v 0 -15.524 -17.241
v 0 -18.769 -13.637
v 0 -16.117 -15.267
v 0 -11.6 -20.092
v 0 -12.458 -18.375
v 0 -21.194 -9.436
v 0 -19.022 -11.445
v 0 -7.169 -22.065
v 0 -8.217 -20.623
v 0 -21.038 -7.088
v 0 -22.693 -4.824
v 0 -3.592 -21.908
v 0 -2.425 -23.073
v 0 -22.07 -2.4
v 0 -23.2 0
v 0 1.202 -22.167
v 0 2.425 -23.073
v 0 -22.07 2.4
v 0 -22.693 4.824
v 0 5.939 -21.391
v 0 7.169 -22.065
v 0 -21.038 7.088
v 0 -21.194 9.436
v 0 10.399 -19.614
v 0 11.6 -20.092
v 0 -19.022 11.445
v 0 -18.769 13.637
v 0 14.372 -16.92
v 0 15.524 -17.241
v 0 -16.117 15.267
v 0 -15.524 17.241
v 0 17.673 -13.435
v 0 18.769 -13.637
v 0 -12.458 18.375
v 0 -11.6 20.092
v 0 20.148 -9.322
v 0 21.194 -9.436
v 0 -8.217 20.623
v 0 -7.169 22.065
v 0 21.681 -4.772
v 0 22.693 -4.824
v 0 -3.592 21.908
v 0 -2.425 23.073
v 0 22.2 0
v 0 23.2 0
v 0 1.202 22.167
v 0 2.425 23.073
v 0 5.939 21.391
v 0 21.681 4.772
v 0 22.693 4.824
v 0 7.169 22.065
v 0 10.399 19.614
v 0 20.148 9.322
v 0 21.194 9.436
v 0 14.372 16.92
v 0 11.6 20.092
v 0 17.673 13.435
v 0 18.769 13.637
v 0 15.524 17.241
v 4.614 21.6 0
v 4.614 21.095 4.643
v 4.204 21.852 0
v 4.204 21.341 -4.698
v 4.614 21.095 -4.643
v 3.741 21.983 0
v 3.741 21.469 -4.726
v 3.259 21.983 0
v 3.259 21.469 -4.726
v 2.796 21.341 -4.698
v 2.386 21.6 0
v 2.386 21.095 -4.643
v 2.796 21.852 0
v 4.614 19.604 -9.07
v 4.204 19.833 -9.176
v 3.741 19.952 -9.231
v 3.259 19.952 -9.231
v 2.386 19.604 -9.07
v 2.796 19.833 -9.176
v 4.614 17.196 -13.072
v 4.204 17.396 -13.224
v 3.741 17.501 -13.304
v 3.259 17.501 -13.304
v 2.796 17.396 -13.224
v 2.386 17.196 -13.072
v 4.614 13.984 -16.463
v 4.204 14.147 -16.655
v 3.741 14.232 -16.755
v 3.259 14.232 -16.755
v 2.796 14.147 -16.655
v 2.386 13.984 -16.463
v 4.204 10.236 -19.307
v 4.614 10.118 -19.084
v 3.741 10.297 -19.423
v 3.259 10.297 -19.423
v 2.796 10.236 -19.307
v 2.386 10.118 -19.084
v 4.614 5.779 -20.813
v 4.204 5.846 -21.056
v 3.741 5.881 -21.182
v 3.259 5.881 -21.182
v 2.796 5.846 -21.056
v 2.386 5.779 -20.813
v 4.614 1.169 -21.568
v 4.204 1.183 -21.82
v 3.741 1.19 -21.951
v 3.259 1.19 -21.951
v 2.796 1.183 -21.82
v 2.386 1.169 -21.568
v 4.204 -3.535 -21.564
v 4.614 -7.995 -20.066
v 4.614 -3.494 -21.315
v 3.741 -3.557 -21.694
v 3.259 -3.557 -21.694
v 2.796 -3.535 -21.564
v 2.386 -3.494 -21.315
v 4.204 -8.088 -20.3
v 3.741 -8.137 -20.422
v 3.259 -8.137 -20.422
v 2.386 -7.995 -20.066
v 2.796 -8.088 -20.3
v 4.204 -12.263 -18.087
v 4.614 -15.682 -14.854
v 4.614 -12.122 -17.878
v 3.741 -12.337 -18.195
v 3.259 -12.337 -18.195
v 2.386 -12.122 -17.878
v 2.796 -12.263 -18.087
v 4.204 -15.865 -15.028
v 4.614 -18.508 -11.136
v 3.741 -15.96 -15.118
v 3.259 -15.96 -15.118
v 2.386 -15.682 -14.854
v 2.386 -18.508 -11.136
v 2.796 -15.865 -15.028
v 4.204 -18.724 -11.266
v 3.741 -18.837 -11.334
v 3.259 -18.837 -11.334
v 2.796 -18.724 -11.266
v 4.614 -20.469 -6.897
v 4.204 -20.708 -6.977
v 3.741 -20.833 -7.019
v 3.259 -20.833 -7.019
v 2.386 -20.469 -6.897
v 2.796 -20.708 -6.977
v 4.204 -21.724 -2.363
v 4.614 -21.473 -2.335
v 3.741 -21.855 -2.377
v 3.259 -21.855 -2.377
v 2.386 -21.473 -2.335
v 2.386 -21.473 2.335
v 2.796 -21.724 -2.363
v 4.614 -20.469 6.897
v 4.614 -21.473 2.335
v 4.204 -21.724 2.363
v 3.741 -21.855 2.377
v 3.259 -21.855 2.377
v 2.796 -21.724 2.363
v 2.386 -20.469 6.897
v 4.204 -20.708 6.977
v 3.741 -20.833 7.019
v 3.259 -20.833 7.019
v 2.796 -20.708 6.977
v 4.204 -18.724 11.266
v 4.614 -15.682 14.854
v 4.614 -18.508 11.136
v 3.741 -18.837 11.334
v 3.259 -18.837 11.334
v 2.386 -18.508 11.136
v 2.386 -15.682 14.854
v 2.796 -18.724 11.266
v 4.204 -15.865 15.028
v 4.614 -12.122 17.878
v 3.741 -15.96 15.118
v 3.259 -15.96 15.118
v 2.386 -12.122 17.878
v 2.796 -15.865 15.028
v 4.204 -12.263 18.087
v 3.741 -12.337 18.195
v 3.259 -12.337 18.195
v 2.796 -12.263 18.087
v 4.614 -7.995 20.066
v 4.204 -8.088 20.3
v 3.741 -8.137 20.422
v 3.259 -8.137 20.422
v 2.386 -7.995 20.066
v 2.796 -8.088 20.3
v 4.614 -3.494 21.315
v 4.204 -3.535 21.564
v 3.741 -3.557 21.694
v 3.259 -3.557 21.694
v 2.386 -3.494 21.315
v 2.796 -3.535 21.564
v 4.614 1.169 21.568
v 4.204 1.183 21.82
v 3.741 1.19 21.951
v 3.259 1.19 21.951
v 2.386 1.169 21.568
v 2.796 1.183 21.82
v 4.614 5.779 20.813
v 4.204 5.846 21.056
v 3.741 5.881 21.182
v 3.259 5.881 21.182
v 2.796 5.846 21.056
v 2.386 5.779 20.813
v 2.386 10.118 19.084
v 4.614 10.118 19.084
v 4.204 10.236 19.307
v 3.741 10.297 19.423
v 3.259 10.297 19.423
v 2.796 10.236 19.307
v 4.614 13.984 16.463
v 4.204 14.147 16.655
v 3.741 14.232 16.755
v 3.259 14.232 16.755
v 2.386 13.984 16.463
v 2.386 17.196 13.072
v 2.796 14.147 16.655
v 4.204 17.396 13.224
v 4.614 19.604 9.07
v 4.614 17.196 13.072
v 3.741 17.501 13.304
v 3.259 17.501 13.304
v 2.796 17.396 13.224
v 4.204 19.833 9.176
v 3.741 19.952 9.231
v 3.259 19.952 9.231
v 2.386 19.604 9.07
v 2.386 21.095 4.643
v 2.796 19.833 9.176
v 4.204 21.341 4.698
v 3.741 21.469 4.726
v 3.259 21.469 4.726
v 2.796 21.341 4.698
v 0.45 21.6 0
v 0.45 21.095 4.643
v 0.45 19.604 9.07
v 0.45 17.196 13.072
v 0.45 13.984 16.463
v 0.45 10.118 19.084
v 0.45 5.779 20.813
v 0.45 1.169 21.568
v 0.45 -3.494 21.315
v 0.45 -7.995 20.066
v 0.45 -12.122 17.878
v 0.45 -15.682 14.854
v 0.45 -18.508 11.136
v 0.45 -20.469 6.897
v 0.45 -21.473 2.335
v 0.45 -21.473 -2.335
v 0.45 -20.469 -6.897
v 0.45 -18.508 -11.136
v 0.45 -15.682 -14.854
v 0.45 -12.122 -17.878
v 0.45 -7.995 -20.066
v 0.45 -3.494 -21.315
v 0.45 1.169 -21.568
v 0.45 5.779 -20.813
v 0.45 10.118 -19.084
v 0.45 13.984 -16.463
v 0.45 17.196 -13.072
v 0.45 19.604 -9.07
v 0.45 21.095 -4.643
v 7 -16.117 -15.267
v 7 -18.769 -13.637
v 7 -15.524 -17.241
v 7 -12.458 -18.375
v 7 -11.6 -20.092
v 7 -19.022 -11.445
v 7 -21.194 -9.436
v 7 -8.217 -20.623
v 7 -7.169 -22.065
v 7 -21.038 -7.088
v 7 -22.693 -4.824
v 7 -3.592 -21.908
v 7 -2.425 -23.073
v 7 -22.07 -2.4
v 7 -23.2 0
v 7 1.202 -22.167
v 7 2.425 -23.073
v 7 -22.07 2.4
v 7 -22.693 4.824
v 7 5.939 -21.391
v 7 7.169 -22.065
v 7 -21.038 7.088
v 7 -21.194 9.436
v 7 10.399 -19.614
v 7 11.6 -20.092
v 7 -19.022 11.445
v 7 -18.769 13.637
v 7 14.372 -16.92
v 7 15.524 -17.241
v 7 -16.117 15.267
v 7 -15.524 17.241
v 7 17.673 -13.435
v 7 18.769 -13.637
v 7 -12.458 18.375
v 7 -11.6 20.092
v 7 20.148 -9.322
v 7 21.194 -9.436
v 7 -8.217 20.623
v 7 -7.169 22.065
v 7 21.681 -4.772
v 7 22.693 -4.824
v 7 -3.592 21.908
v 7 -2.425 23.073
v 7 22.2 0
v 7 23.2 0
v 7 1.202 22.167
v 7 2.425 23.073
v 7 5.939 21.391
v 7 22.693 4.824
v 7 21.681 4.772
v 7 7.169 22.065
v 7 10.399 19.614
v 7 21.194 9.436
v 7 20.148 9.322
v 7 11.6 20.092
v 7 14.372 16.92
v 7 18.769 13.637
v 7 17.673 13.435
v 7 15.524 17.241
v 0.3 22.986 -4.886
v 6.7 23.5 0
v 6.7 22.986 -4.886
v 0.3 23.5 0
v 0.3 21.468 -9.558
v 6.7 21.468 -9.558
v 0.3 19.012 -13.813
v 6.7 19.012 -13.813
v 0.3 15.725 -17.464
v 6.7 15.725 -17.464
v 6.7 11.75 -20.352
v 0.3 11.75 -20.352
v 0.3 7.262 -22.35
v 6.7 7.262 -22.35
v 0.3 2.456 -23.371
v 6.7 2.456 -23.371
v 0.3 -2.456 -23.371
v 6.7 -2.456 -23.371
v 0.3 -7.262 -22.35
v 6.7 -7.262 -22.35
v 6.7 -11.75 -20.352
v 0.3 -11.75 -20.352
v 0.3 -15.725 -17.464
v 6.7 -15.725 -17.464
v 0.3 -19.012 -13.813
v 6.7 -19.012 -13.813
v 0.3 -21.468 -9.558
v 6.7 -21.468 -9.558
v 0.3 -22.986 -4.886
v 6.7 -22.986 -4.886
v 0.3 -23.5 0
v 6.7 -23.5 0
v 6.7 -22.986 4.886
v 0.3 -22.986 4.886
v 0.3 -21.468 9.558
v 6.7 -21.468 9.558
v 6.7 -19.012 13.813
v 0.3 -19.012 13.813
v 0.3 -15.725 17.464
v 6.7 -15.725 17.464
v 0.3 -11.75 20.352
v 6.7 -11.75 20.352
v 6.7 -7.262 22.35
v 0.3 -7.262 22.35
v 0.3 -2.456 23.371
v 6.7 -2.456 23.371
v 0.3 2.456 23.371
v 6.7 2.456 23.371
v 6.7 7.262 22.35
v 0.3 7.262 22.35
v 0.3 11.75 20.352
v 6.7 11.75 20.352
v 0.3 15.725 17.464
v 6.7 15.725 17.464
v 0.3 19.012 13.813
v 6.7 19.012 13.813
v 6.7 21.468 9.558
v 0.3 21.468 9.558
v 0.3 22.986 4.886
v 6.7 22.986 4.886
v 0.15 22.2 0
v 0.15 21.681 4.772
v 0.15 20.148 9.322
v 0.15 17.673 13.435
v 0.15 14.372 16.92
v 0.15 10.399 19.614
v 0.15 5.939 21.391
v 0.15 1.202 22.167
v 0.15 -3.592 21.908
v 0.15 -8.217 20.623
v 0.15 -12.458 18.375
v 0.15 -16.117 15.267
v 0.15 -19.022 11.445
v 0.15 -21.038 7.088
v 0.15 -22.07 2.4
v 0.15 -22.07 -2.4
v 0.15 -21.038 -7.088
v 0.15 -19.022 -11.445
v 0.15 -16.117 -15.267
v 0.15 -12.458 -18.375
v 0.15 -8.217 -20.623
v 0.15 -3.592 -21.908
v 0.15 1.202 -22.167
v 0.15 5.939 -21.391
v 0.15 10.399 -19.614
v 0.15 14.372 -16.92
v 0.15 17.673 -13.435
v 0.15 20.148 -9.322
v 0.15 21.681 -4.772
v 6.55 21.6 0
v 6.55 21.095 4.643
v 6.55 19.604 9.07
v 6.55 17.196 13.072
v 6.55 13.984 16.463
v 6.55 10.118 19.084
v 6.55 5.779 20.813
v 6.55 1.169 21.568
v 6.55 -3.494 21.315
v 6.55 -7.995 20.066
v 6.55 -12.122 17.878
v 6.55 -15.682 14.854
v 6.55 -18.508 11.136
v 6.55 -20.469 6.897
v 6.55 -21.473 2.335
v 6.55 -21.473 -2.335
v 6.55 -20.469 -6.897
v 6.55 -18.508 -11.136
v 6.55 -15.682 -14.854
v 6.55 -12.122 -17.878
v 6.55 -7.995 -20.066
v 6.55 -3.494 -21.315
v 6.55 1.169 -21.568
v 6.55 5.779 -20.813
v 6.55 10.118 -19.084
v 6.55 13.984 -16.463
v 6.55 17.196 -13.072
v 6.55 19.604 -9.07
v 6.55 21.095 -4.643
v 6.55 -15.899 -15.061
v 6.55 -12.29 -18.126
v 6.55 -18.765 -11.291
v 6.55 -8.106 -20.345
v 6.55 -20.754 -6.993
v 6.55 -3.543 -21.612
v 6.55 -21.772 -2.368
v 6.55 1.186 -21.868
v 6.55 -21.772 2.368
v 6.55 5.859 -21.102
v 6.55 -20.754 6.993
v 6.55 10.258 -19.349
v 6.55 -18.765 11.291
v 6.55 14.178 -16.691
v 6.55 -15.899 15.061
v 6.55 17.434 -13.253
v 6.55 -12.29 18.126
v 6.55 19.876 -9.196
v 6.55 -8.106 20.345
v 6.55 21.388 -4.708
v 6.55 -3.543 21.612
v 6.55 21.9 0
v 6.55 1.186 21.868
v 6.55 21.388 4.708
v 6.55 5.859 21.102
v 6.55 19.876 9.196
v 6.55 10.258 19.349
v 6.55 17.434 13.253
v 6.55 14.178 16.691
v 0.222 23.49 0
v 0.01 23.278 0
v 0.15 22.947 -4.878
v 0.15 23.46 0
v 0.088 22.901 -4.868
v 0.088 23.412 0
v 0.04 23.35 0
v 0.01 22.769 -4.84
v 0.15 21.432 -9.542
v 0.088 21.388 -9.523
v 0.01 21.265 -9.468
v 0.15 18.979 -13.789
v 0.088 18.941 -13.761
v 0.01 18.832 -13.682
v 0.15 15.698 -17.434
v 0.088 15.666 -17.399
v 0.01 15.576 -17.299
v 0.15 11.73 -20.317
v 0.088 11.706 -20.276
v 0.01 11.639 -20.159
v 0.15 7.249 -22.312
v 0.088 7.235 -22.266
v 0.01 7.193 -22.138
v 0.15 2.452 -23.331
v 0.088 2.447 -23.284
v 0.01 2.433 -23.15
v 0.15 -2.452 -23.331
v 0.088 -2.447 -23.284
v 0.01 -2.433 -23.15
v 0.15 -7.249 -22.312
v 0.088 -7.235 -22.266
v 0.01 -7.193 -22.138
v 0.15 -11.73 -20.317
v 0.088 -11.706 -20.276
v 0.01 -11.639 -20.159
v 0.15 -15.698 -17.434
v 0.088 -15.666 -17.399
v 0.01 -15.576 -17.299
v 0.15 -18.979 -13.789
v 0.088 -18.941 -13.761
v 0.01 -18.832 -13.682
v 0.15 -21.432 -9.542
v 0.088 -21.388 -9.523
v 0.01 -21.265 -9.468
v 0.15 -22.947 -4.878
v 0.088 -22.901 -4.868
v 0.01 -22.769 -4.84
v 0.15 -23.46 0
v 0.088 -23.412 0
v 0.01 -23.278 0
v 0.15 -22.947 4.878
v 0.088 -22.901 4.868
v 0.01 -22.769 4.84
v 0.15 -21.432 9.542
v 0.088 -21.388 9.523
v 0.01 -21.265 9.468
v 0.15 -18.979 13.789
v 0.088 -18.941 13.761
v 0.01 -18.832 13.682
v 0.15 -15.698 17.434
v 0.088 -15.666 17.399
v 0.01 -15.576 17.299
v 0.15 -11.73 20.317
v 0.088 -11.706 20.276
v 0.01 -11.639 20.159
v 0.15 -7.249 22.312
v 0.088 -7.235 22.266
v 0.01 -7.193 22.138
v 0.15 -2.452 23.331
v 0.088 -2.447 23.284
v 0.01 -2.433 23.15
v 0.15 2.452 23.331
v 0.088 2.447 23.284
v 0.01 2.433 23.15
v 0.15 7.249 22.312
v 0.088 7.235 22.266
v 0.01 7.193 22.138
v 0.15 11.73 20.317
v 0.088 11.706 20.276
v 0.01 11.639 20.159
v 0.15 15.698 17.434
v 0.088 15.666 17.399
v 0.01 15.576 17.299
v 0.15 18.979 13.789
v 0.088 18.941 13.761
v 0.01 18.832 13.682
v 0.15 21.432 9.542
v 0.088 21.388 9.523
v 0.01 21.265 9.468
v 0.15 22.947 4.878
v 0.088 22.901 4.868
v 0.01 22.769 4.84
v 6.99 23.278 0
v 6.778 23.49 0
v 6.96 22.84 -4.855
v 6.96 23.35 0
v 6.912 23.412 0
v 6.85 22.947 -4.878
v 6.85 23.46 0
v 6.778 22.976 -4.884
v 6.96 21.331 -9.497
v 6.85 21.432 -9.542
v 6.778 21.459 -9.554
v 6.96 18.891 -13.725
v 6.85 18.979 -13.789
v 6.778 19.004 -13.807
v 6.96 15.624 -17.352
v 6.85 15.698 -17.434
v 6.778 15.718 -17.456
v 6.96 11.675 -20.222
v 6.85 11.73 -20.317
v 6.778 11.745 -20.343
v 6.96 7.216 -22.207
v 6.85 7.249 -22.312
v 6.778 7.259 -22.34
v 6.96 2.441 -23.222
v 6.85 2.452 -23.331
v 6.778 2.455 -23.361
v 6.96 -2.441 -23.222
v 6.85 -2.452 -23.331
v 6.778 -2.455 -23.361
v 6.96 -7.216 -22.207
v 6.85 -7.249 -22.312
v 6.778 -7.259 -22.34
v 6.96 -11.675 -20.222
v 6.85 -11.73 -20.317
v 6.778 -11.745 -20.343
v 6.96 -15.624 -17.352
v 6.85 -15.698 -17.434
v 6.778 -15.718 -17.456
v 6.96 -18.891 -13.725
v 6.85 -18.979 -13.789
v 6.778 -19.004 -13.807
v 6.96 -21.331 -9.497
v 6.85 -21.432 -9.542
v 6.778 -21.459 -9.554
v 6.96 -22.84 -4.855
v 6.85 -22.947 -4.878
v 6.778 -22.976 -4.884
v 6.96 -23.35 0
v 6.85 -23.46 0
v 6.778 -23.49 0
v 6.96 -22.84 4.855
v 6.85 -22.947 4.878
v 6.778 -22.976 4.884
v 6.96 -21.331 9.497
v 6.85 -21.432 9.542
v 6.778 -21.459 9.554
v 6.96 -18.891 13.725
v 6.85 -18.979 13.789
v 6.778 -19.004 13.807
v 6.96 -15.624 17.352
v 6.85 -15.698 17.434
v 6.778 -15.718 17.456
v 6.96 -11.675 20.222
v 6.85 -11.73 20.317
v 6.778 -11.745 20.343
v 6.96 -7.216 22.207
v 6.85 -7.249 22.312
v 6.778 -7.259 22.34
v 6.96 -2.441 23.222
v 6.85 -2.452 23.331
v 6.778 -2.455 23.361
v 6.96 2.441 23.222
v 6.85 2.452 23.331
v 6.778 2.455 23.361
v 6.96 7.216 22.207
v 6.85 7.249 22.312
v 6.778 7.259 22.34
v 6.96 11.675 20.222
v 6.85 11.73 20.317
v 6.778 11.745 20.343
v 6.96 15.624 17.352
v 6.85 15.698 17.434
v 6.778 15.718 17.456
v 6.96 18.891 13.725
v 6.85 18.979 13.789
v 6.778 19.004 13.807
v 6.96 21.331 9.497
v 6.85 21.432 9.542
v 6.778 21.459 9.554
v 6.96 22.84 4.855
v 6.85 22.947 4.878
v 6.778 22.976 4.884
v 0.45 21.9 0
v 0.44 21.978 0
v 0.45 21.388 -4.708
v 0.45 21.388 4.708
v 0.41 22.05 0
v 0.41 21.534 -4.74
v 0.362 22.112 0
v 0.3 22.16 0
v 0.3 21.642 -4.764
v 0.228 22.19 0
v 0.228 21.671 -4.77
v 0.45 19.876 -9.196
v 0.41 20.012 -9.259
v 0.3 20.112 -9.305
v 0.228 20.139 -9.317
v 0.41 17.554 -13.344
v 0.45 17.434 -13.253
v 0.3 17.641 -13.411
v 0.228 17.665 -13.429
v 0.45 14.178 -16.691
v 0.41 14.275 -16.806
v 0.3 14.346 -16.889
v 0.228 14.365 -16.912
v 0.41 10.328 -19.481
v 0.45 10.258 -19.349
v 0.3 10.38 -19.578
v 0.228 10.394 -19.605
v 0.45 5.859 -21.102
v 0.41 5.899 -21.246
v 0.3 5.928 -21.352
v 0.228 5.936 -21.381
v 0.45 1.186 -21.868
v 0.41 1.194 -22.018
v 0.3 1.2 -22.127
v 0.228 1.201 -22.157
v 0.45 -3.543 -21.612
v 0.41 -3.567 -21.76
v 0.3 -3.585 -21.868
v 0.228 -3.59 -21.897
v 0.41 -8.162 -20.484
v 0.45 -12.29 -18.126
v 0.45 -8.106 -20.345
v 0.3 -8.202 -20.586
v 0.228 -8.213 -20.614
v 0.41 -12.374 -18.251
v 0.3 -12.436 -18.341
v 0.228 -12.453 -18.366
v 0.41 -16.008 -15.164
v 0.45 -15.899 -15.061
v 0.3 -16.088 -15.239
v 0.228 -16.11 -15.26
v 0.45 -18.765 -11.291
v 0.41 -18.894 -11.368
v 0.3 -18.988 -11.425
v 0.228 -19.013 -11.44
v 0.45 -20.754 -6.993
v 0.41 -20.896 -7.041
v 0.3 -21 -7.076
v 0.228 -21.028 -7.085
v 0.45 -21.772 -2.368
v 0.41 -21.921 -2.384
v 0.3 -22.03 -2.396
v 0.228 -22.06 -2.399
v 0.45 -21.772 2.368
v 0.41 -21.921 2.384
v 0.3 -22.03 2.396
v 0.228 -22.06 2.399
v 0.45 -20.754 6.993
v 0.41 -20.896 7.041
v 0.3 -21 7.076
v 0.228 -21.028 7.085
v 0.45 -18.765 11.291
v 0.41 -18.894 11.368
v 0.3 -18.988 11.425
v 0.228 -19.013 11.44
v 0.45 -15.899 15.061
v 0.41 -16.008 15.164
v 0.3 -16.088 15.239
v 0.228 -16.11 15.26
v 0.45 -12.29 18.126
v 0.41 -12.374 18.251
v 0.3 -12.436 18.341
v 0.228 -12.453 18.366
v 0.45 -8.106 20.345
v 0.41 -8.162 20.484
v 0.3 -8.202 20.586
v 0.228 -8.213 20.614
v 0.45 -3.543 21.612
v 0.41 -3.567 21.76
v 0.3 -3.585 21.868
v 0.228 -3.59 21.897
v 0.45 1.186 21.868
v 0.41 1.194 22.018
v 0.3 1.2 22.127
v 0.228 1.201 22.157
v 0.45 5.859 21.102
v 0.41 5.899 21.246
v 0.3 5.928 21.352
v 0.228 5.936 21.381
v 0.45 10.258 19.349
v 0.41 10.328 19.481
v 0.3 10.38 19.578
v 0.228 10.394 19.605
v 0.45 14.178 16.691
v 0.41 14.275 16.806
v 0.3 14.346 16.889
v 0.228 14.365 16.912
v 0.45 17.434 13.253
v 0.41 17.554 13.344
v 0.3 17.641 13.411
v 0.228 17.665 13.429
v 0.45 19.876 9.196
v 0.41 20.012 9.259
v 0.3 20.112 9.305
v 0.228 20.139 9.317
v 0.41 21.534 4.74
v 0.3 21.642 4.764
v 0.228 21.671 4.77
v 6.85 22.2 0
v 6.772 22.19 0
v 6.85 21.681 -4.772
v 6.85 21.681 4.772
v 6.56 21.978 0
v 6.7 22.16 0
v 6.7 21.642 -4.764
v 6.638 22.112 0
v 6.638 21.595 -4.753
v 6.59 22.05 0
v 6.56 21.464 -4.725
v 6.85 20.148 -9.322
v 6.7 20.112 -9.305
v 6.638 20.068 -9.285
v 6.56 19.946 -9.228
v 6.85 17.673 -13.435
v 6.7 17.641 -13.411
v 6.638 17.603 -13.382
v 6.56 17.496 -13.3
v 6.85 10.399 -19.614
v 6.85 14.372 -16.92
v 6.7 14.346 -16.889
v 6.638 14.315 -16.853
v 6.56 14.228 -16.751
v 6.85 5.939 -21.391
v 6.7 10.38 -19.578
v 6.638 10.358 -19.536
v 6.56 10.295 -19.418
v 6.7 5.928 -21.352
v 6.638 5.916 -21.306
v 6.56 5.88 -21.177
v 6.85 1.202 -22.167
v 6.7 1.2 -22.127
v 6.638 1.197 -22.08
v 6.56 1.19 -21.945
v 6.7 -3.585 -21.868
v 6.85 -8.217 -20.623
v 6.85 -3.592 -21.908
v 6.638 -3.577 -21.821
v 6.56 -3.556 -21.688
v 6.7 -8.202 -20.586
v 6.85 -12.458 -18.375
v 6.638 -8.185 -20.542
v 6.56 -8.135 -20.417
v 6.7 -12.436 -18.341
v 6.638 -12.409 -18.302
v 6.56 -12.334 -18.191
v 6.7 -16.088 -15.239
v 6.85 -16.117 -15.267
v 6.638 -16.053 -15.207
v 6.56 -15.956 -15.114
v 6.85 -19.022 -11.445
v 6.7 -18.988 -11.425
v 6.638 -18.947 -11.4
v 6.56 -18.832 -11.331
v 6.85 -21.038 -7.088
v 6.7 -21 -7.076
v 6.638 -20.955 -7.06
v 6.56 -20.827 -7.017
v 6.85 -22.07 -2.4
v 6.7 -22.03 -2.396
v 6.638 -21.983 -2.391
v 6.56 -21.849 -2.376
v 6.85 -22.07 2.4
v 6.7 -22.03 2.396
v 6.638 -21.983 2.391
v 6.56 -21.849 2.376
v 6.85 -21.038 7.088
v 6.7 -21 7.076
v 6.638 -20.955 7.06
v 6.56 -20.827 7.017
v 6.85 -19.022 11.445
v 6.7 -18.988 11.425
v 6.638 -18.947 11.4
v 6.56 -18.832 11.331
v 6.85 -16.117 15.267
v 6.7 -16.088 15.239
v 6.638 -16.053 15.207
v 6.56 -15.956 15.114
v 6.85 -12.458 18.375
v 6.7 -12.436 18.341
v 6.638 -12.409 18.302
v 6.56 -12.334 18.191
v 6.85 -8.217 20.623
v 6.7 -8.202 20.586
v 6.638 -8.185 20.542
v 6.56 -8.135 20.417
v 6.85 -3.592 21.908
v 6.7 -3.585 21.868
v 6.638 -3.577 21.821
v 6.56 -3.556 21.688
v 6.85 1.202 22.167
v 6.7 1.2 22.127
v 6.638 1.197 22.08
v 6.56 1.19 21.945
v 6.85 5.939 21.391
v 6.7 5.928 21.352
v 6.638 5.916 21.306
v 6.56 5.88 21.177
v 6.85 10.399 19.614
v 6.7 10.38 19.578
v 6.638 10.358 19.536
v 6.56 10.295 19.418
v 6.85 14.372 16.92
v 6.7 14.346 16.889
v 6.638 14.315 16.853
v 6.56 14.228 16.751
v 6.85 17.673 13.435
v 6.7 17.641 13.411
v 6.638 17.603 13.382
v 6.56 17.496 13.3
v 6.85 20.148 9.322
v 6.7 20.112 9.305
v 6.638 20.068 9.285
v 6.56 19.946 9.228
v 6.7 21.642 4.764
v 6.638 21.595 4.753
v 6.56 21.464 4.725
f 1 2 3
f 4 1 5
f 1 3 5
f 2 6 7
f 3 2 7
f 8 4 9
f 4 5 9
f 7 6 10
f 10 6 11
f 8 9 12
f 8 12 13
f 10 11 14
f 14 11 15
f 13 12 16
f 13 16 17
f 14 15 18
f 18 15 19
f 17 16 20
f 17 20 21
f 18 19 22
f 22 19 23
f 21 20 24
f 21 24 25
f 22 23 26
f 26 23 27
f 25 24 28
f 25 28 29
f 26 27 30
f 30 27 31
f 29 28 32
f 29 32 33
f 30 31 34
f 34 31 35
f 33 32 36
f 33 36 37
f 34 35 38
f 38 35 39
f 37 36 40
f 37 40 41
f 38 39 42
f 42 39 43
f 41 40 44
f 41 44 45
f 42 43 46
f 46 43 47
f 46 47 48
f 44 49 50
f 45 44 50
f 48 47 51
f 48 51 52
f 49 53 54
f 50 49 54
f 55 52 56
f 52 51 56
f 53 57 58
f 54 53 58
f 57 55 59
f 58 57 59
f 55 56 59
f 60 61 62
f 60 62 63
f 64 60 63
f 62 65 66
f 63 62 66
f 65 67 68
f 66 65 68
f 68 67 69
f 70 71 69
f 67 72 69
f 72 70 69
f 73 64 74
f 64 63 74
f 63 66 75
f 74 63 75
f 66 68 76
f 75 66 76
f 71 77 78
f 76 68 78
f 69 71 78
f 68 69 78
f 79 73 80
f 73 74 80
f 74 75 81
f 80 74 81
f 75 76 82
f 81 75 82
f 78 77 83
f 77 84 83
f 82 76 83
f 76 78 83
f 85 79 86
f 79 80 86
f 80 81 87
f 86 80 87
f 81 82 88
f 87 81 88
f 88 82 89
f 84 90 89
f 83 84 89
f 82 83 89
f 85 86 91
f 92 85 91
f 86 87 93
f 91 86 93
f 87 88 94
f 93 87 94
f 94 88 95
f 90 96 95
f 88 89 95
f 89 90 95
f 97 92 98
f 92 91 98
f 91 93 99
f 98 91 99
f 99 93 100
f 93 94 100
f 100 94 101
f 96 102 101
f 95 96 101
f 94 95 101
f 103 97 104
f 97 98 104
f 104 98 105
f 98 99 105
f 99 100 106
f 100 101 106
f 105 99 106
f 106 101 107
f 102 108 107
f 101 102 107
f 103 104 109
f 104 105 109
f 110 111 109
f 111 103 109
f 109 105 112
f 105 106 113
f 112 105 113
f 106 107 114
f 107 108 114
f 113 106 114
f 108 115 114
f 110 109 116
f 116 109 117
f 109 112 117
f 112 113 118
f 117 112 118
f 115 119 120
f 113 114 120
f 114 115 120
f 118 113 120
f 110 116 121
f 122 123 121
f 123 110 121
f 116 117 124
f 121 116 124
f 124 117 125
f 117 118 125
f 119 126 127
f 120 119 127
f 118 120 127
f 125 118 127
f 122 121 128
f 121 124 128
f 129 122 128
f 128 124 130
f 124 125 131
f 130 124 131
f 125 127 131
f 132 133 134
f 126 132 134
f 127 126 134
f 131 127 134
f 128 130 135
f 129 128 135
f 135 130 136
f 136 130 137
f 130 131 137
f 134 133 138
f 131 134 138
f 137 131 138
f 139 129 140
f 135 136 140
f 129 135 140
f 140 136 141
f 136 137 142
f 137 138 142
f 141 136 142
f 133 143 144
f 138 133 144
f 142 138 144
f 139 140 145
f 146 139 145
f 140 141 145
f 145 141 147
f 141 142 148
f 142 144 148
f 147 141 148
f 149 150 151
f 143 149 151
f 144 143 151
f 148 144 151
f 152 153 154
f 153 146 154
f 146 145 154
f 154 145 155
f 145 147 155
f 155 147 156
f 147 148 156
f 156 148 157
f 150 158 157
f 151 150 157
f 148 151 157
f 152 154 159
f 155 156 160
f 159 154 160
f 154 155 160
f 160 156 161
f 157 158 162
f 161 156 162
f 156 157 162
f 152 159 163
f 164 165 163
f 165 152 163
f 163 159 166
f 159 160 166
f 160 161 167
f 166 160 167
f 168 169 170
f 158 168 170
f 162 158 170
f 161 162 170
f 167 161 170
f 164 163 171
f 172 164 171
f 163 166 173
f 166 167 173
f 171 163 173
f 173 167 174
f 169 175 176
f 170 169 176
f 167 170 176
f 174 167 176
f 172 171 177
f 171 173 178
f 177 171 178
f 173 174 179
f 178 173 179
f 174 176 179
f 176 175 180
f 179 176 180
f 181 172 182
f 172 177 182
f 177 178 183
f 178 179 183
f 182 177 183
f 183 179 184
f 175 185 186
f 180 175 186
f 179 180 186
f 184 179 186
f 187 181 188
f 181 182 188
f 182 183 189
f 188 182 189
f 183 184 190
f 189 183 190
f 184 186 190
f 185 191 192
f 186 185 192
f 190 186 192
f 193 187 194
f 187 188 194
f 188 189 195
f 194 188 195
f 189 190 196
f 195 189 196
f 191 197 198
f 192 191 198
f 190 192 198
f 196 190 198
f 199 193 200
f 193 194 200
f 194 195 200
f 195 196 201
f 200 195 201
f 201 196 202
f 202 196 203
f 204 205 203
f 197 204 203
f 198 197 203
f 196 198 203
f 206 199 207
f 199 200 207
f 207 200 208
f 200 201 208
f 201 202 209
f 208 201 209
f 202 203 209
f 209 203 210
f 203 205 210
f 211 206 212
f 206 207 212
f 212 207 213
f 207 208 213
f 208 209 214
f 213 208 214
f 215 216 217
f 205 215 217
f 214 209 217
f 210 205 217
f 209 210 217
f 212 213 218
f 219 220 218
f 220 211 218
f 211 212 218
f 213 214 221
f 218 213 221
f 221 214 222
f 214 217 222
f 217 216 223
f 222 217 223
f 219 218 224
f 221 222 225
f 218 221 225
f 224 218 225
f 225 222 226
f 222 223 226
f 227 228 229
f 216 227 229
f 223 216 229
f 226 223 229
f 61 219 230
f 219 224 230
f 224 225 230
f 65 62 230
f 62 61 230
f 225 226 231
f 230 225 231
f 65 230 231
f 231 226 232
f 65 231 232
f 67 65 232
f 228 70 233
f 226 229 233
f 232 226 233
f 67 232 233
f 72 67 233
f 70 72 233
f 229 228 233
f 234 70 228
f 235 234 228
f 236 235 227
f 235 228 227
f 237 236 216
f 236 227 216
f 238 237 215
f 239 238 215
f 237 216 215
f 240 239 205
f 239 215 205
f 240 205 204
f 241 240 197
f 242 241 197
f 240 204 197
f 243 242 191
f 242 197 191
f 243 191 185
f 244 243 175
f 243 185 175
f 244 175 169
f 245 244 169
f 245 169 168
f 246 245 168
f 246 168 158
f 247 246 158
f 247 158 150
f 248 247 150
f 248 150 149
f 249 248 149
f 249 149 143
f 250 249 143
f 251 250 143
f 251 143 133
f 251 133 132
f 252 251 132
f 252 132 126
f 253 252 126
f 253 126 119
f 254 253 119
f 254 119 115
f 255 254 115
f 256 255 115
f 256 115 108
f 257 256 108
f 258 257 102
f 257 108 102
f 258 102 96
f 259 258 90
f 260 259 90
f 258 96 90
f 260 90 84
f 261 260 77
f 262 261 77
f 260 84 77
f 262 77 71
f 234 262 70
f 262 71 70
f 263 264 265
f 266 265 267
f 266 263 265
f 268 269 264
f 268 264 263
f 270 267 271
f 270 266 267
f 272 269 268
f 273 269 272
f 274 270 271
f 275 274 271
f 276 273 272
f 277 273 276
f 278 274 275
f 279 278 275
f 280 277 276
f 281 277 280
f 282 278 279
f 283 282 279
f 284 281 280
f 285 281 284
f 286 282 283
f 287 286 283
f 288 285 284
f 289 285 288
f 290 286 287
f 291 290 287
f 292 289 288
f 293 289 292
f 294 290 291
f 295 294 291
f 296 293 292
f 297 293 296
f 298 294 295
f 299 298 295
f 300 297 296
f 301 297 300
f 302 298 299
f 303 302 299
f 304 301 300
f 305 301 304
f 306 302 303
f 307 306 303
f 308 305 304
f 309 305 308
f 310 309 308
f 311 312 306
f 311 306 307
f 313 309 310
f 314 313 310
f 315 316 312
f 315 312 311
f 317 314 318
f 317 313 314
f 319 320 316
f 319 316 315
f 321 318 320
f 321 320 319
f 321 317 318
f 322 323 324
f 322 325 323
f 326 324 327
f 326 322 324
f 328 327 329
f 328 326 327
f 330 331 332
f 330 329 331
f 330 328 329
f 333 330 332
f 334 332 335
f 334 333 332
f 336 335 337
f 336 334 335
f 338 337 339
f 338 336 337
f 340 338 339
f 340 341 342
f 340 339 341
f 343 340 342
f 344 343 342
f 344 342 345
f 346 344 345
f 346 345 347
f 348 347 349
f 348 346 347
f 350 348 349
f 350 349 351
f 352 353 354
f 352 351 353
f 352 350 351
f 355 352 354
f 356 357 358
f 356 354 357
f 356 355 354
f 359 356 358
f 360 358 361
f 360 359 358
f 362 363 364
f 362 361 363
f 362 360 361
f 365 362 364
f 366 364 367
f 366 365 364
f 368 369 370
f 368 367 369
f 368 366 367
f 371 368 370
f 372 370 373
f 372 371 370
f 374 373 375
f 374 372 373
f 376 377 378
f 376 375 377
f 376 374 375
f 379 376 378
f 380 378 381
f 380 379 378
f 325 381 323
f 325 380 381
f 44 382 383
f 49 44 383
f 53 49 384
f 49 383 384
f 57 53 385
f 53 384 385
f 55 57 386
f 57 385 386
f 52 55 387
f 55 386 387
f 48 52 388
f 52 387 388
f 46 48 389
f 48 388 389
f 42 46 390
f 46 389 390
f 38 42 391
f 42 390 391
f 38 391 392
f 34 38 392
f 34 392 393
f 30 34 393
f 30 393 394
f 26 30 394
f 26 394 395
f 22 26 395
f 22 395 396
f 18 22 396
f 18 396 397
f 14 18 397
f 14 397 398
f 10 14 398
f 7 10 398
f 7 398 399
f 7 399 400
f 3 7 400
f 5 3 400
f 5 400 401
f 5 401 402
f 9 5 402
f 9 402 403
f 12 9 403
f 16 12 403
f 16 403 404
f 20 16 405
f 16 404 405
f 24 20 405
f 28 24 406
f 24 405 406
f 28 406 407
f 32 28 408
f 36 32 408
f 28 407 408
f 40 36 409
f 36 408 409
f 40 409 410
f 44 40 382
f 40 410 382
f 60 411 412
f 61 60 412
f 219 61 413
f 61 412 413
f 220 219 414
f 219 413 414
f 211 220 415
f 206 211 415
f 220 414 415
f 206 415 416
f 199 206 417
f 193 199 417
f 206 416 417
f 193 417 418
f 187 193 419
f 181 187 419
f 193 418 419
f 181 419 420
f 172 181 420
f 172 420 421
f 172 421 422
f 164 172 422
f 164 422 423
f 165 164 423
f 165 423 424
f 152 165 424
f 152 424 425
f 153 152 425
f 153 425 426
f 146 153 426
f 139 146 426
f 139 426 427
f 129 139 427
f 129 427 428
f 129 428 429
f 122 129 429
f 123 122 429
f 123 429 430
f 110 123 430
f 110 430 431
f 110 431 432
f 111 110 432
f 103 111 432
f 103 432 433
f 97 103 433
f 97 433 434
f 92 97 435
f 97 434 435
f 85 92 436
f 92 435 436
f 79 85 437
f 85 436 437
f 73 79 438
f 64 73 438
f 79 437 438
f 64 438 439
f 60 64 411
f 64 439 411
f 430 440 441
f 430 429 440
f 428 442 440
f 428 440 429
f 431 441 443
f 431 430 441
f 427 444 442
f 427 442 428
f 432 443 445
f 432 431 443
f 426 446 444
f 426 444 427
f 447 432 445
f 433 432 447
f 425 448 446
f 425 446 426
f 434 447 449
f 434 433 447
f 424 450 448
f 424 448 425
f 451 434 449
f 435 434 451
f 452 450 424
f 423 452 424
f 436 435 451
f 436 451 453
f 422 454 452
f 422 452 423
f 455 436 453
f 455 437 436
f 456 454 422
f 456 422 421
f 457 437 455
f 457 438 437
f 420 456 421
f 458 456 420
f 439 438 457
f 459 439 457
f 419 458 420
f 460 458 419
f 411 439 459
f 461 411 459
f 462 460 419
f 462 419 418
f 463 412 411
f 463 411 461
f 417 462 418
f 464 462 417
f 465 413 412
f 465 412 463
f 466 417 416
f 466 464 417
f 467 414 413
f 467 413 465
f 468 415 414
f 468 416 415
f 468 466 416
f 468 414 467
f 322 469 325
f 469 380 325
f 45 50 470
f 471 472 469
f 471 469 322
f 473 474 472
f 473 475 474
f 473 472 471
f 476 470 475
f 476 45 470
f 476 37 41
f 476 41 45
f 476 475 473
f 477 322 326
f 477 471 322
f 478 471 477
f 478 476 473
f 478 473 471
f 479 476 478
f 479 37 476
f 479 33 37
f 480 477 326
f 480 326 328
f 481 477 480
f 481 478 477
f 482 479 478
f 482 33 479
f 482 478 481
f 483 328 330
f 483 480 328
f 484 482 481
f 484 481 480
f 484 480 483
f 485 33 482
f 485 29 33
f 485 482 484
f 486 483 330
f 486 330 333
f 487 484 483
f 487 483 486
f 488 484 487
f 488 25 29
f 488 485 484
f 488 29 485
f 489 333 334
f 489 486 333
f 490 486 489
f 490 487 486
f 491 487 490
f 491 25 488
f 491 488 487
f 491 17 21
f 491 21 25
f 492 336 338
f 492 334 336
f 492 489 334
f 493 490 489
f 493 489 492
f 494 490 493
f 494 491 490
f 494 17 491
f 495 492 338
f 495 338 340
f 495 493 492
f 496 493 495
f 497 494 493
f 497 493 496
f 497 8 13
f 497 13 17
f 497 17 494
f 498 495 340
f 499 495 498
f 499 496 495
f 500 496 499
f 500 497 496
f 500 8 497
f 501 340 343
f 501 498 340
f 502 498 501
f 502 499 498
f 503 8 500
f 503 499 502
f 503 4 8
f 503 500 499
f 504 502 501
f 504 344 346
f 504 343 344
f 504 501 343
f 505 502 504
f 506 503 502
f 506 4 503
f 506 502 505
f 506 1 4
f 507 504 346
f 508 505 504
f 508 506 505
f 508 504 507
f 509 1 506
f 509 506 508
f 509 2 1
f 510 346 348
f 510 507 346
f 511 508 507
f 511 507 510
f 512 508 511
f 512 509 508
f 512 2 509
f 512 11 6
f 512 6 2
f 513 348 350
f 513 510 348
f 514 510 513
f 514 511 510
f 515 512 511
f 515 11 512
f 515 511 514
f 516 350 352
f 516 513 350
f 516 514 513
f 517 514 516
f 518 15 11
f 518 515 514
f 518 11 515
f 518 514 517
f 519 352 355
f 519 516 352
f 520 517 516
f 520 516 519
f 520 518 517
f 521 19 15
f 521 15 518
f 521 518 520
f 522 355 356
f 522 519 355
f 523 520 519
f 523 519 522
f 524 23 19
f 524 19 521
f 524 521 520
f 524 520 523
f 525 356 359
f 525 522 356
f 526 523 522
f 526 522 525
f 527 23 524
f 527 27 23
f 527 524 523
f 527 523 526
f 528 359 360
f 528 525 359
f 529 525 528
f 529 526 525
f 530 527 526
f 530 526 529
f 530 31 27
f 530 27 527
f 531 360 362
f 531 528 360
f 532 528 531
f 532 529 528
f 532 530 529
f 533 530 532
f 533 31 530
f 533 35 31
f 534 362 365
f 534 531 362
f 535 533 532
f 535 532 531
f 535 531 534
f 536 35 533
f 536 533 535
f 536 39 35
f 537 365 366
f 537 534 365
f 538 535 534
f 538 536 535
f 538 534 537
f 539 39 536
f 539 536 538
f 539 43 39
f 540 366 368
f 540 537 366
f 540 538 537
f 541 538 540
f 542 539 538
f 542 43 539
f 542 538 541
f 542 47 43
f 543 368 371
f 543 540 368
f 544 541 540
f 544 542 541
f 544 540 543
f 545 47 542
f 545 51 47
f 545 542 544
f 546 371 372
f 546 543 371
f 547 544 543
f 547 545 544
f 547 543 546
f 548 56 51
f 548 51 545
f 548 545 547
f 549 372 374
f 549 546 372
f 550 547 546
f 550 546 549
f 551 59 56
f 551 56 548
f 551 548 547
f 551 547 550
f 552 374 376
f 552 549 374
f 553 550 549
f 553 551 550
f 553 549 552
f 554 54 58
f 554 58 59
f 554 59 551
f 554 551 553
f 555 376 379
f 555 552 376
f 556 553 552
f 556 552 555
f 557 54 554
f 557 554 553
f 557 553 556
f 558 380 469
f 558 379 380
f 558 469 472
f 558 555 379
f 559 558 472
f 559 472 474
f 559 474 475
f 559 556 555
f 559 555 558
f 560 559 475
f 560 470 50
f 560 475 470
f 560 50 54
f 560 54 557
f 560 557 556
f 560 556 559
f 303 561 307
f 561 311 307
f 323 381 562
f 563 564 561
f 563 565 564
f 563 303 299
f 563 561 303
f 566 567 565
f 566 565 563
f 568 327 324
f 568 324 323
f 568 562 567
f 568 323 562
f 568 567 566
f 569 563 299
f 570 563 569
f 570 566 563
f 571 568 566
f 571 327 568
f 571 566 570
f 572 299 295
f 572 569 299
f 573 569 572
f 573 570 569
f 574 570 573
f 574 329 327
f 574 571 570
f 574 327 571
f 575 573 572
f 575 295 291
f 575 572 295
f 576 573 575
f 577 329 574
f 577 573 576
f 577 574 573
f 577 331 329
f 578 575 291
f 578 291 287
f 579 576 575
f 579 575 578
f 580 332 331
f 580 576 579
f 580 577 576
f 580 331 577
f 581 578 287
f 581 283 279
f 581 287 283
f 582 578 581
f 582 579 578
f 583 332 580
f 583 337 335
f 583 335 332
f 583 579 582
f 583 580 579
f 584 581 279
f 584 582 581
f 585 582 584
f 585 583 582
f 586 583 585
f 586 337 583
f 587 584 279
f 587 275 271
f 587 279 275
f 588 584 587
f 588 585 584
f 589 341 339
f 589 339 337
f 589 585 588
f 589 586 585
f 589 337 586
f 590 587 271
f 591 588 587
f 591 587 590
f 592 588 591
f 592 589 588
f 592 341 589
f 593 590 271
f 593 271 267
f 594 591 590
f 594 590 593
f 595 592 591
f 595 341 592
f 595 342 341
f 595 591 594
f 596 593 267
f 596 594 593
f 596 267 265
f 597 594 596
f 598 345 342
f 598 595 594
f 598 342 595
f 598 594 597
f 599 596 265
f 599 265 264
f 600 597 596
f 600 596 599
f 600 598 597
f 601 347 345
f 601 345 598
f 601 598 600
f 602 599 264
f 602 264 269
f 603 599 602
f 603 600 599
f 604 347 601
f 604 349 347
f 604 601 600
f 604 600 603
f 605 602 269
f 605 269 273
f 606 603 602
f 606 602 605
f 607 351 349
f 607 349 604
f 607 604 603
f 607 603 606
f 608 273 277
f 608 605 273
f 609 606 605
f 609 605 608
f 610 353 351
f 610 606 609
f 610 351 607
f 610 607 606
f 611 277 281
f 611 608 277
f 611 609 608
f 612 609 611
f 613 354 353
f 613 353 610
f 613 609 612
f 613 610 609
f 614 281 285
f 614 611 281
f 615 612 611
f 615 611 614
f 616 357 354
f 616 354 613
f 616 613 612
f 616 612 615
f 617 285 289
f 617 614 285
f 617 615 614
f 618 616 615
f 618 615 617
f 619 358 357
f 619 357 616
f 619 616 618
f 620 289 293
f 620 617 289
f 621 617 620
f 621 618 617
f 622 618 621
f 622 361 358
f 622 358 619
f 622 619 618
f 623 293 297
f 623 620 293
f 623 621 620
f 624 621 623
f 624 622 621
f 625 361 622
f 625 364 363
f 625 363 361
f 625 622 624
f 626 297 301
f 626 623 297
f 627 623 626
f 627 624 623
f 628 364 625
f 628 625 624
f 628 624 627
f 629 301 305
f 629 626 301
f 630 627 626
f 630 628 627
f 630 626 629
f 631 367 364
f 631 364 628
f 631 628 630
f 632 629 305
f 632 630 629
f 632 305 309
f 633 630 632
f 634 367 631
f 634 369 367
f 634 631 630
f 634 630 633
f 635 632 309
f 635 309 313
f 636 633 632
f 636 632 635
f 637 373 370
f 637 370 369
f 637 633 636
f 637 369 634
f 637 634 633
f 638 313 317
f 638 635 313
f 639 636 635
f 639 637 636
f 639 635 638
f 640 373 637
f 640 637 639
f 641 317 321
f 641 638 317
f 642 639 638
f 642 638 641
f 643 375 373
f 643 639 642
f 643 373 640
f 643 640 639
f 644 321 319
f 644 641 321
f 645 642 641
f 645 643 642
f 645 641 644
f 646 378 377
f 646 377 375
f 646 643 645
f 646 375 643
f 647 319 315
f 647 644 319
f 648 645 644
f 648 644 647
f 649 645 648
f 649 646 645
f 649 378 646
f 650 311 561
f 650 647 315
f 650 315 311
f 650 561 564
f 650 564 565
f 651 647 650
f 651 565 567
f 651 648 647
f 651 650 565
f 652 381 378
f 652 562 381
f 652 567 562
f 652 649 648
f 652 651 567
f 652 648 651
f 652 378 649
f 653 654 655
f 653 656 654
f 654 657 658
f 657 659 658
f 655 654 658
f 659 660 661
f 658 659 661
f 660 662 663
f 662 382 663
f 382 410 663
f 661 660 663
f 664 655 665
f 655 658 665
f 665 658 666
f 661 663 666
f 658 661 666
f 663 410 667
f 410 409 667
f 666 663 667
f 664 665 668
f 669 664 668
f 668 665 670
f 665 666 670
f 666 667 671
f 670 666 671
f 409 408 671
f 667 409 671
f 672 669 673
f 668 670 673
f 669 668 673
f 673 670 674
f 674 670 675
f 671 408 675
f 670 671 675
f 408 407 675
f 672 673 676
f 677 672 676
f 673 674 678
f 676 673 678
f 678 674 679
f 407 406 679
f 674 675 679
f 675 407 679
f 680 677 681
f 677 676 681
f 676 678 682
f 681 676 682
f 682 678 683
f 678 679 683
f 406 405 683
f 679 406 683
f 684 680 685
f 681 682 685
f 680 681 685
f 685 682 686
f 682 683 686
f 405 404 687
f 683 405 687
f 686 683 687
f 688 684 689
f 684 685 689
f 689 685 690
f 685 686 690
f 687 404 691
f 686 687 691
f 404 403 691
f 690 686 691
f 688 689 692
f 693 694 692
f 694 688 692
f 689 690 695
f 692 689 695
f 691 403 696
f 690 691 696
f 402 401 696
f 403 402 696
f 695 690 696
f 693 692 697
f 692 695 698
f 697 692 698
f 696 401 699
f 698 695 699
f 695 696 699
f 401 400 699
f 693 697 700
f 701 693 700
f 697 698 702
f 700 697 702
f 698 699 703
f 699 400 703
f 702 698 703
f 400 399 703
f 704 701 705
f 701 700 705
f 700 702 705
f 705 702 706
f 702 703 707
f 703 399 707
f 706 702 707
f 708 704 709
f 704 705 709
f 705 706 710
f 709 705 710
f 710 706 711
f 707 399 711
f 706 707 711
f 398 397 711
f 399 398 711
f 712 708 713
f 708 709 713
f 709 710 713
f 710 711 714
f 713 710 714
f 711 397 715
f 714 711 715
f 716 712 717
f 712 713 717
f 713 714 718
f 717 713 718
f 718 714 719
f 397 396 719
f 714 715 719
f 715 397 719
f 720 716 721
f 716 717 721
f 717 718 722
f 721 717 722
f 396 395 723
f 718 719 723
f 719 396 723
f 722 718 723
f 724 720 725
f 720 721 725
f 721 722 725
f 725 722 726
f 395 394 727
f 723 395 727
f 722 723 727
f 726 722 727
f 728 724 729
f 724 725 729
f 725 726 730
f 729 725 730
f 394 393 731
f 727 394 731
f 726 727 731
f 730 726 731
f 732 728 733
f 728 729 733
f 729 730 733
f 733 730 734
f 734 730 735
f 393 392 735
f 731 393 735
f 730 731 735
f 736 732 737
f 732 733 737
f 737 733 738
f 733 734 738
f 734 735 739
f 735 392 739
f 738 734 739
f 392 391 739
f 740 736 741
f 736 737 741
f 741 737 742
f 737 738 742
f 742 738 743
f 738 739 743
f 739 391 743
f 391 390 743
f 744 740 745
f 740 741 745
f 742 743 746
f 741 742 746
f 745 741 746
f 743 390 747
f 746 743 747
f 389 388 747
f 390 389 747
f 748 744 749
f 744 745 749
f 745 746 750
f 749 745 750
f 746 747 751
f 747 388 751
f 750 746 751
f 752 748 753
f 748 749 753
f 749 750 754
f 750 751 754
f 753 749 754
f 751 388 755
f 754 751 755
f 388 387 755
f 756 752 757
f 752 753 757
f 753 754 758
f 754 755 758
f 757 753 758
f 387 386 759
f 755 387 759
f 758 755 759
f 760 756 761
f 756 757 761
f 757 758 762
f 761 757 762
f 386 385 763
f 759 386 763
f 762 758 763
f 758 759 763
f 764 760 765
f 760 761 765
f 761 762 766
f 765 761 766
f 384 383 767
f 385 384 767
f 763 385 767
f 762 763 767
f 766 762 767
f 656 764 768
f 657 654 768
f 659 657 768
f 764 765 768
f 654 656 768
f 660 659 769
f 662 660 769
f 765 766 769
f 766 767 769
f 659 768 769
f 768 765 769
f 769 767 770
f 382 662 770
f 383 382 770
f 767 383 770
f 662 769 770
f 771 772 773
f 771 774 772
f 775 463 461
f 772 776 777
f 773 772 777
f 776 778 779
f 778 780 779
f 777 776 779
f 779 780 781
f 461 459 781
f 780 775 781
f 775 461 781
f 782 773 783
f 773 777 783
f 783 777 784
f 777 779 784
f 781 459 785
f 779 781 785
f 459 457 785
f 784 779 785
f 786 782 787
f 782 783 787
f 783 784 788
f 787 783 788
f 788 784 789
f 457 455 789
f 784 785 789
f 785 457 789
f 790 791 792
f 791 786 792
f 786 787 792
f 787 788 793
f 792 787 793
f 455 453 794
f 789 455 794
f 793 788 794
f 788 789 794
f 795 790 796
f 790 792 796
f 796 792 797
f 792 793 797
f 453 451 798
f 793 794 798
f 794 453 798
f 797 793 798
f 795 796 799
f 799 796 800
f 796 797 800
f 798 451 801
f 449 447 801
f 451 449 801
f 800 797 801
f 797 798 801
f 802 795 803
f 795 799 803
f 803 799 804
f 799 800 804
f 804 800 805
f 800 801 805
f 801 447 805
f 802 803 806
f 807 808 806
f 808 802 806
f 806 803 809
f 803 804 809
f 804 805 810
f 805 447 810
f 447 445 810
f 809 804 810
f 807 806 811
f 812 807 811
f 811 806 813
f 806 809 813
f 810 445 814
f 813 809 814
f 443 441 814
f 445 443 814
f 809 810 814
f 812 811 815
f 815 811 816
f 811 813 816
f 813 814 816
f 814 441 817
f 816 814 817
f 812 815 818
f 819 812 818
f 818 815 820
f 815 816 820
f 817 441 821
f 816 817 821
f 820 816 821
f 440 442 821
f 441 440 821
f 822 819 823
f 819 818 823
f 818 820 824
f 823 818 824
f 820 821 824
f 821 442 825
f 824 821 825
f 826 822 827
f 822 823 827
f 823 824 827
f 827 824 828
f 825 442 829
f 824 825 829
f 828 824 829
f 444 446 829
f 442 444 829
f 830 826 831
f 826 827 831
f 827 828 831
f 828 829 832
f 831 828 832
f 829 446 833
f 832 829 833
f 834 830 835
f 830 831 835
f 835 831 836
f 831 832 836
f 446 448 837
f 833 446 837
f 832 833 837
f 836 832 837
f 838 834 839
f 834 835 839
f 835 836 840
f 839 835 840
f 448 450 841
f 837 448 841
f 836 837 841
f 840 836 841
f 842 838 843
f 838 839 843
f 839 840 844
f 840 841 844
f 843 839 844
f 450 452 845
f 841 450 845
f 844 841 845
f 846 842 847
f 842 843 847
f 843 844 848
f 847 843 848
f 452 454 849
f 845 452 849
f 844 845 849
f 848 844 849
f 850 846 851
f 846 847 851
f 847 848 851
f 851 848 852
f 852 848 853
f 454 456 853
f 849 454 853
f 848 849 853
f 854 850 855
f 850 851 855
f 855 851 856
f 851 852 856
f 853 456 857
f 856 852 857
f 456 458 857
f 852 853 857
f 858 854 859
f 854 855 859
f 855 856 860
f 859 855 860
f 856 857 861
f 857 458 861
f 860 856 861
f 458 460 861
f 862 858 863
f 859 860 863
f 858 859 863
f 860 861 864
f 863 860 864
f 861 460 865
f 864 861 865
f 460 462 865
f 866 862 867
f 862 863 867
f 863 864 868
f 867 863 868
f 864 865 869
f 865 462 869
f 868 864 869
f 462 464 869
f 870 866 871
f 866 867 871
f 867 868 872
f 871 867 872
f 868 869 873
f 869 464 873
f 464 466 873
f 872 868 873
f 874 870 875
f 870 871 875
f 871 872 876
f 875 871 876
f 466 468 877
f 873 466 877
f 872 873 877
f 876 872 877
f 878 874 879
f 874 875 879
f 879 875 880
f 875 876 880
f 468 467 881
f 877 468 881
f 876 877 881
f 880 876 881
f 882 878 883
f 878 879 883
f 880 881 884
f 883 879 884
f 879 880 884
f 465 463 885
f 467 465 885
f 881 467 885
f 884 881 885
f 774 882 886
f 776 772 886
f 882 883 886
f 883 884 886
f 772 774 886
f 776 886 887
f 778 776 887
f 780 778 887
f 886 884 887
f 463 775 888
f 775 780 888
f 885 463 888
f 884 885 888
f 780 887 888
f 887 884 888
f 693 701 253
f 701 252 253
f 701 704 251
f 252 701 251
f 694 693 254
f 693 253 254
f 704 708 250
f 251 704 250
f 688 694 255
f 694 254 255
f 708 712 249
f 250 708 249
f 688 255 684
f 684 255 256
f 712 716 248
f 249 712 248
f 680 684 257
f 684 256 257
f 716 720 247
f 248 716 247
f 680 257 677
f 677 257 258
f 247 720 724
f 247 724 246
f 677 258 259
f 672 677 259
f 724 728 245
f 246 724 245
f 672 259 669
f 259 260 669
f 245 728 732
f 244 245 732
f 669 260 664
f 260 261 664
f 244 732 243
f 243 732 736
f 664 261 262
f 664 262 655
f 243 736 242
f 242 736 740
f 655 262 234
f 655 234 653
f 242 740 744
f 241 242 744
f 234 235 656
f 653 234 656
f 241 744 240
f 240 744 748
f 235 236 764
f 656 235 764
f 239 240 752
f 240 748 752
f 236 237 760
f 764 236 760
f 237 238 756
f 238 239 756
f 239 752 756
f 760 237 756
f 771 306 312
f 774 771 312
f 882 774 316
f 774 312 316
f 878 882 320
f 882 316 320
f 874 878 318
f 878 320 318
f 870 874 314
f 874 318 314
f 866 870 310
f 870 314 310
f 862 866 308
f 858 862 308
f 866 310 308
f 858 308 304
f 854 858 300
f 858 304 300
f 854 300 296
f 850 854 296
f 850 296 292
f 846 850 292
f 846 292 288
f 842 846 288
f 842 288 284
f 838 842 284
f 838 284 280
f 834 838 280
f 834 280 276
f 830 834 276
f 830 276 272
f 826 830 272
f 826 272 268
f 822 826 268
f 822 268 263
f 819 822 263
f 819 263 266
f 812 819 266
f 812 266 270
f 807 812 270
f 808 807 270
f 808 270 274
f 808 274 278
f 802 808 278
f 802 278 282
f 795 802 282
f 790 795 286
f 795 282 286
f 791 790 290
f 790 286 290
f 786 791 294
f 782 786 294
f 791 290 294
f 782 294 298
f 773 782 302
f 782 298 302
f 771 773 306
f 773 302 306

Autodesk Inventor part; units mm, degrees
ref_plane "YZ Plane" through (0, 0, 0) normal (1, 0, 0) x (0, 1, 0)
ref_plane "XZ Plane" through (0, 0, 0) normal (0, 1, 0) x (-1, 0, 0)
ref_plane "XY Plane" through (0, 0, 0) normal (0, 0, 1) x (1, 0, 0)
sketch "Sketch_9" plane through (0, 0, 0) normal (0, 0, 1) x (1, 0, 0)
  line L0 (50, 0) -> (-50, 0)
  line L1 (0, 23.2) -> (0, 22.2)
  line L2 (0, 22.2) -> (0.15, 22.2)
  arc A0 (0.45, 21.9) -> (0.15, 22.2) centre (0.15, 21.9) ccw
  line L3 (0.45, 21.9) -> (0.45, 21.6)
  line L4 (0.45, 21.6) -> (2.3864, 21.6)
  arc A1 (4.6136, 21.6) -> (2.3864, 21.6) centre (3.5, 20.25) ccw
  line L5 (4.6136, 21.6) -> (6.55, 21.6)
  line L6 (6.55, 21.6) -> (6.55, 21.9)
  arc A2 (6.85, 22.2) -> (6.55, 21.9) centre (6.85, 21.9) ccw
  line L7 (6.85, 22.2) -> (7, 22.2)
  line L8 (7, 22.2) -> (7, 23.2)
  arc A3 (7, 23.2) -> (6.7, 23.5) centre (6.7, 23.2) ccw
  line L9 (6.7, 23.5) -> (0.3, 23.5)
  arc A4 (0.3, 23.5) -> (0, 23.2) centre (0.3, 23.2) ccw
revolve "Revolution1" add sketch "Sketch_9" angle 360 about axis through (50, 0, 0) along (1, 0, 0)
properties part number "61807-2RS1_PART2" material "Stainless Steel"
